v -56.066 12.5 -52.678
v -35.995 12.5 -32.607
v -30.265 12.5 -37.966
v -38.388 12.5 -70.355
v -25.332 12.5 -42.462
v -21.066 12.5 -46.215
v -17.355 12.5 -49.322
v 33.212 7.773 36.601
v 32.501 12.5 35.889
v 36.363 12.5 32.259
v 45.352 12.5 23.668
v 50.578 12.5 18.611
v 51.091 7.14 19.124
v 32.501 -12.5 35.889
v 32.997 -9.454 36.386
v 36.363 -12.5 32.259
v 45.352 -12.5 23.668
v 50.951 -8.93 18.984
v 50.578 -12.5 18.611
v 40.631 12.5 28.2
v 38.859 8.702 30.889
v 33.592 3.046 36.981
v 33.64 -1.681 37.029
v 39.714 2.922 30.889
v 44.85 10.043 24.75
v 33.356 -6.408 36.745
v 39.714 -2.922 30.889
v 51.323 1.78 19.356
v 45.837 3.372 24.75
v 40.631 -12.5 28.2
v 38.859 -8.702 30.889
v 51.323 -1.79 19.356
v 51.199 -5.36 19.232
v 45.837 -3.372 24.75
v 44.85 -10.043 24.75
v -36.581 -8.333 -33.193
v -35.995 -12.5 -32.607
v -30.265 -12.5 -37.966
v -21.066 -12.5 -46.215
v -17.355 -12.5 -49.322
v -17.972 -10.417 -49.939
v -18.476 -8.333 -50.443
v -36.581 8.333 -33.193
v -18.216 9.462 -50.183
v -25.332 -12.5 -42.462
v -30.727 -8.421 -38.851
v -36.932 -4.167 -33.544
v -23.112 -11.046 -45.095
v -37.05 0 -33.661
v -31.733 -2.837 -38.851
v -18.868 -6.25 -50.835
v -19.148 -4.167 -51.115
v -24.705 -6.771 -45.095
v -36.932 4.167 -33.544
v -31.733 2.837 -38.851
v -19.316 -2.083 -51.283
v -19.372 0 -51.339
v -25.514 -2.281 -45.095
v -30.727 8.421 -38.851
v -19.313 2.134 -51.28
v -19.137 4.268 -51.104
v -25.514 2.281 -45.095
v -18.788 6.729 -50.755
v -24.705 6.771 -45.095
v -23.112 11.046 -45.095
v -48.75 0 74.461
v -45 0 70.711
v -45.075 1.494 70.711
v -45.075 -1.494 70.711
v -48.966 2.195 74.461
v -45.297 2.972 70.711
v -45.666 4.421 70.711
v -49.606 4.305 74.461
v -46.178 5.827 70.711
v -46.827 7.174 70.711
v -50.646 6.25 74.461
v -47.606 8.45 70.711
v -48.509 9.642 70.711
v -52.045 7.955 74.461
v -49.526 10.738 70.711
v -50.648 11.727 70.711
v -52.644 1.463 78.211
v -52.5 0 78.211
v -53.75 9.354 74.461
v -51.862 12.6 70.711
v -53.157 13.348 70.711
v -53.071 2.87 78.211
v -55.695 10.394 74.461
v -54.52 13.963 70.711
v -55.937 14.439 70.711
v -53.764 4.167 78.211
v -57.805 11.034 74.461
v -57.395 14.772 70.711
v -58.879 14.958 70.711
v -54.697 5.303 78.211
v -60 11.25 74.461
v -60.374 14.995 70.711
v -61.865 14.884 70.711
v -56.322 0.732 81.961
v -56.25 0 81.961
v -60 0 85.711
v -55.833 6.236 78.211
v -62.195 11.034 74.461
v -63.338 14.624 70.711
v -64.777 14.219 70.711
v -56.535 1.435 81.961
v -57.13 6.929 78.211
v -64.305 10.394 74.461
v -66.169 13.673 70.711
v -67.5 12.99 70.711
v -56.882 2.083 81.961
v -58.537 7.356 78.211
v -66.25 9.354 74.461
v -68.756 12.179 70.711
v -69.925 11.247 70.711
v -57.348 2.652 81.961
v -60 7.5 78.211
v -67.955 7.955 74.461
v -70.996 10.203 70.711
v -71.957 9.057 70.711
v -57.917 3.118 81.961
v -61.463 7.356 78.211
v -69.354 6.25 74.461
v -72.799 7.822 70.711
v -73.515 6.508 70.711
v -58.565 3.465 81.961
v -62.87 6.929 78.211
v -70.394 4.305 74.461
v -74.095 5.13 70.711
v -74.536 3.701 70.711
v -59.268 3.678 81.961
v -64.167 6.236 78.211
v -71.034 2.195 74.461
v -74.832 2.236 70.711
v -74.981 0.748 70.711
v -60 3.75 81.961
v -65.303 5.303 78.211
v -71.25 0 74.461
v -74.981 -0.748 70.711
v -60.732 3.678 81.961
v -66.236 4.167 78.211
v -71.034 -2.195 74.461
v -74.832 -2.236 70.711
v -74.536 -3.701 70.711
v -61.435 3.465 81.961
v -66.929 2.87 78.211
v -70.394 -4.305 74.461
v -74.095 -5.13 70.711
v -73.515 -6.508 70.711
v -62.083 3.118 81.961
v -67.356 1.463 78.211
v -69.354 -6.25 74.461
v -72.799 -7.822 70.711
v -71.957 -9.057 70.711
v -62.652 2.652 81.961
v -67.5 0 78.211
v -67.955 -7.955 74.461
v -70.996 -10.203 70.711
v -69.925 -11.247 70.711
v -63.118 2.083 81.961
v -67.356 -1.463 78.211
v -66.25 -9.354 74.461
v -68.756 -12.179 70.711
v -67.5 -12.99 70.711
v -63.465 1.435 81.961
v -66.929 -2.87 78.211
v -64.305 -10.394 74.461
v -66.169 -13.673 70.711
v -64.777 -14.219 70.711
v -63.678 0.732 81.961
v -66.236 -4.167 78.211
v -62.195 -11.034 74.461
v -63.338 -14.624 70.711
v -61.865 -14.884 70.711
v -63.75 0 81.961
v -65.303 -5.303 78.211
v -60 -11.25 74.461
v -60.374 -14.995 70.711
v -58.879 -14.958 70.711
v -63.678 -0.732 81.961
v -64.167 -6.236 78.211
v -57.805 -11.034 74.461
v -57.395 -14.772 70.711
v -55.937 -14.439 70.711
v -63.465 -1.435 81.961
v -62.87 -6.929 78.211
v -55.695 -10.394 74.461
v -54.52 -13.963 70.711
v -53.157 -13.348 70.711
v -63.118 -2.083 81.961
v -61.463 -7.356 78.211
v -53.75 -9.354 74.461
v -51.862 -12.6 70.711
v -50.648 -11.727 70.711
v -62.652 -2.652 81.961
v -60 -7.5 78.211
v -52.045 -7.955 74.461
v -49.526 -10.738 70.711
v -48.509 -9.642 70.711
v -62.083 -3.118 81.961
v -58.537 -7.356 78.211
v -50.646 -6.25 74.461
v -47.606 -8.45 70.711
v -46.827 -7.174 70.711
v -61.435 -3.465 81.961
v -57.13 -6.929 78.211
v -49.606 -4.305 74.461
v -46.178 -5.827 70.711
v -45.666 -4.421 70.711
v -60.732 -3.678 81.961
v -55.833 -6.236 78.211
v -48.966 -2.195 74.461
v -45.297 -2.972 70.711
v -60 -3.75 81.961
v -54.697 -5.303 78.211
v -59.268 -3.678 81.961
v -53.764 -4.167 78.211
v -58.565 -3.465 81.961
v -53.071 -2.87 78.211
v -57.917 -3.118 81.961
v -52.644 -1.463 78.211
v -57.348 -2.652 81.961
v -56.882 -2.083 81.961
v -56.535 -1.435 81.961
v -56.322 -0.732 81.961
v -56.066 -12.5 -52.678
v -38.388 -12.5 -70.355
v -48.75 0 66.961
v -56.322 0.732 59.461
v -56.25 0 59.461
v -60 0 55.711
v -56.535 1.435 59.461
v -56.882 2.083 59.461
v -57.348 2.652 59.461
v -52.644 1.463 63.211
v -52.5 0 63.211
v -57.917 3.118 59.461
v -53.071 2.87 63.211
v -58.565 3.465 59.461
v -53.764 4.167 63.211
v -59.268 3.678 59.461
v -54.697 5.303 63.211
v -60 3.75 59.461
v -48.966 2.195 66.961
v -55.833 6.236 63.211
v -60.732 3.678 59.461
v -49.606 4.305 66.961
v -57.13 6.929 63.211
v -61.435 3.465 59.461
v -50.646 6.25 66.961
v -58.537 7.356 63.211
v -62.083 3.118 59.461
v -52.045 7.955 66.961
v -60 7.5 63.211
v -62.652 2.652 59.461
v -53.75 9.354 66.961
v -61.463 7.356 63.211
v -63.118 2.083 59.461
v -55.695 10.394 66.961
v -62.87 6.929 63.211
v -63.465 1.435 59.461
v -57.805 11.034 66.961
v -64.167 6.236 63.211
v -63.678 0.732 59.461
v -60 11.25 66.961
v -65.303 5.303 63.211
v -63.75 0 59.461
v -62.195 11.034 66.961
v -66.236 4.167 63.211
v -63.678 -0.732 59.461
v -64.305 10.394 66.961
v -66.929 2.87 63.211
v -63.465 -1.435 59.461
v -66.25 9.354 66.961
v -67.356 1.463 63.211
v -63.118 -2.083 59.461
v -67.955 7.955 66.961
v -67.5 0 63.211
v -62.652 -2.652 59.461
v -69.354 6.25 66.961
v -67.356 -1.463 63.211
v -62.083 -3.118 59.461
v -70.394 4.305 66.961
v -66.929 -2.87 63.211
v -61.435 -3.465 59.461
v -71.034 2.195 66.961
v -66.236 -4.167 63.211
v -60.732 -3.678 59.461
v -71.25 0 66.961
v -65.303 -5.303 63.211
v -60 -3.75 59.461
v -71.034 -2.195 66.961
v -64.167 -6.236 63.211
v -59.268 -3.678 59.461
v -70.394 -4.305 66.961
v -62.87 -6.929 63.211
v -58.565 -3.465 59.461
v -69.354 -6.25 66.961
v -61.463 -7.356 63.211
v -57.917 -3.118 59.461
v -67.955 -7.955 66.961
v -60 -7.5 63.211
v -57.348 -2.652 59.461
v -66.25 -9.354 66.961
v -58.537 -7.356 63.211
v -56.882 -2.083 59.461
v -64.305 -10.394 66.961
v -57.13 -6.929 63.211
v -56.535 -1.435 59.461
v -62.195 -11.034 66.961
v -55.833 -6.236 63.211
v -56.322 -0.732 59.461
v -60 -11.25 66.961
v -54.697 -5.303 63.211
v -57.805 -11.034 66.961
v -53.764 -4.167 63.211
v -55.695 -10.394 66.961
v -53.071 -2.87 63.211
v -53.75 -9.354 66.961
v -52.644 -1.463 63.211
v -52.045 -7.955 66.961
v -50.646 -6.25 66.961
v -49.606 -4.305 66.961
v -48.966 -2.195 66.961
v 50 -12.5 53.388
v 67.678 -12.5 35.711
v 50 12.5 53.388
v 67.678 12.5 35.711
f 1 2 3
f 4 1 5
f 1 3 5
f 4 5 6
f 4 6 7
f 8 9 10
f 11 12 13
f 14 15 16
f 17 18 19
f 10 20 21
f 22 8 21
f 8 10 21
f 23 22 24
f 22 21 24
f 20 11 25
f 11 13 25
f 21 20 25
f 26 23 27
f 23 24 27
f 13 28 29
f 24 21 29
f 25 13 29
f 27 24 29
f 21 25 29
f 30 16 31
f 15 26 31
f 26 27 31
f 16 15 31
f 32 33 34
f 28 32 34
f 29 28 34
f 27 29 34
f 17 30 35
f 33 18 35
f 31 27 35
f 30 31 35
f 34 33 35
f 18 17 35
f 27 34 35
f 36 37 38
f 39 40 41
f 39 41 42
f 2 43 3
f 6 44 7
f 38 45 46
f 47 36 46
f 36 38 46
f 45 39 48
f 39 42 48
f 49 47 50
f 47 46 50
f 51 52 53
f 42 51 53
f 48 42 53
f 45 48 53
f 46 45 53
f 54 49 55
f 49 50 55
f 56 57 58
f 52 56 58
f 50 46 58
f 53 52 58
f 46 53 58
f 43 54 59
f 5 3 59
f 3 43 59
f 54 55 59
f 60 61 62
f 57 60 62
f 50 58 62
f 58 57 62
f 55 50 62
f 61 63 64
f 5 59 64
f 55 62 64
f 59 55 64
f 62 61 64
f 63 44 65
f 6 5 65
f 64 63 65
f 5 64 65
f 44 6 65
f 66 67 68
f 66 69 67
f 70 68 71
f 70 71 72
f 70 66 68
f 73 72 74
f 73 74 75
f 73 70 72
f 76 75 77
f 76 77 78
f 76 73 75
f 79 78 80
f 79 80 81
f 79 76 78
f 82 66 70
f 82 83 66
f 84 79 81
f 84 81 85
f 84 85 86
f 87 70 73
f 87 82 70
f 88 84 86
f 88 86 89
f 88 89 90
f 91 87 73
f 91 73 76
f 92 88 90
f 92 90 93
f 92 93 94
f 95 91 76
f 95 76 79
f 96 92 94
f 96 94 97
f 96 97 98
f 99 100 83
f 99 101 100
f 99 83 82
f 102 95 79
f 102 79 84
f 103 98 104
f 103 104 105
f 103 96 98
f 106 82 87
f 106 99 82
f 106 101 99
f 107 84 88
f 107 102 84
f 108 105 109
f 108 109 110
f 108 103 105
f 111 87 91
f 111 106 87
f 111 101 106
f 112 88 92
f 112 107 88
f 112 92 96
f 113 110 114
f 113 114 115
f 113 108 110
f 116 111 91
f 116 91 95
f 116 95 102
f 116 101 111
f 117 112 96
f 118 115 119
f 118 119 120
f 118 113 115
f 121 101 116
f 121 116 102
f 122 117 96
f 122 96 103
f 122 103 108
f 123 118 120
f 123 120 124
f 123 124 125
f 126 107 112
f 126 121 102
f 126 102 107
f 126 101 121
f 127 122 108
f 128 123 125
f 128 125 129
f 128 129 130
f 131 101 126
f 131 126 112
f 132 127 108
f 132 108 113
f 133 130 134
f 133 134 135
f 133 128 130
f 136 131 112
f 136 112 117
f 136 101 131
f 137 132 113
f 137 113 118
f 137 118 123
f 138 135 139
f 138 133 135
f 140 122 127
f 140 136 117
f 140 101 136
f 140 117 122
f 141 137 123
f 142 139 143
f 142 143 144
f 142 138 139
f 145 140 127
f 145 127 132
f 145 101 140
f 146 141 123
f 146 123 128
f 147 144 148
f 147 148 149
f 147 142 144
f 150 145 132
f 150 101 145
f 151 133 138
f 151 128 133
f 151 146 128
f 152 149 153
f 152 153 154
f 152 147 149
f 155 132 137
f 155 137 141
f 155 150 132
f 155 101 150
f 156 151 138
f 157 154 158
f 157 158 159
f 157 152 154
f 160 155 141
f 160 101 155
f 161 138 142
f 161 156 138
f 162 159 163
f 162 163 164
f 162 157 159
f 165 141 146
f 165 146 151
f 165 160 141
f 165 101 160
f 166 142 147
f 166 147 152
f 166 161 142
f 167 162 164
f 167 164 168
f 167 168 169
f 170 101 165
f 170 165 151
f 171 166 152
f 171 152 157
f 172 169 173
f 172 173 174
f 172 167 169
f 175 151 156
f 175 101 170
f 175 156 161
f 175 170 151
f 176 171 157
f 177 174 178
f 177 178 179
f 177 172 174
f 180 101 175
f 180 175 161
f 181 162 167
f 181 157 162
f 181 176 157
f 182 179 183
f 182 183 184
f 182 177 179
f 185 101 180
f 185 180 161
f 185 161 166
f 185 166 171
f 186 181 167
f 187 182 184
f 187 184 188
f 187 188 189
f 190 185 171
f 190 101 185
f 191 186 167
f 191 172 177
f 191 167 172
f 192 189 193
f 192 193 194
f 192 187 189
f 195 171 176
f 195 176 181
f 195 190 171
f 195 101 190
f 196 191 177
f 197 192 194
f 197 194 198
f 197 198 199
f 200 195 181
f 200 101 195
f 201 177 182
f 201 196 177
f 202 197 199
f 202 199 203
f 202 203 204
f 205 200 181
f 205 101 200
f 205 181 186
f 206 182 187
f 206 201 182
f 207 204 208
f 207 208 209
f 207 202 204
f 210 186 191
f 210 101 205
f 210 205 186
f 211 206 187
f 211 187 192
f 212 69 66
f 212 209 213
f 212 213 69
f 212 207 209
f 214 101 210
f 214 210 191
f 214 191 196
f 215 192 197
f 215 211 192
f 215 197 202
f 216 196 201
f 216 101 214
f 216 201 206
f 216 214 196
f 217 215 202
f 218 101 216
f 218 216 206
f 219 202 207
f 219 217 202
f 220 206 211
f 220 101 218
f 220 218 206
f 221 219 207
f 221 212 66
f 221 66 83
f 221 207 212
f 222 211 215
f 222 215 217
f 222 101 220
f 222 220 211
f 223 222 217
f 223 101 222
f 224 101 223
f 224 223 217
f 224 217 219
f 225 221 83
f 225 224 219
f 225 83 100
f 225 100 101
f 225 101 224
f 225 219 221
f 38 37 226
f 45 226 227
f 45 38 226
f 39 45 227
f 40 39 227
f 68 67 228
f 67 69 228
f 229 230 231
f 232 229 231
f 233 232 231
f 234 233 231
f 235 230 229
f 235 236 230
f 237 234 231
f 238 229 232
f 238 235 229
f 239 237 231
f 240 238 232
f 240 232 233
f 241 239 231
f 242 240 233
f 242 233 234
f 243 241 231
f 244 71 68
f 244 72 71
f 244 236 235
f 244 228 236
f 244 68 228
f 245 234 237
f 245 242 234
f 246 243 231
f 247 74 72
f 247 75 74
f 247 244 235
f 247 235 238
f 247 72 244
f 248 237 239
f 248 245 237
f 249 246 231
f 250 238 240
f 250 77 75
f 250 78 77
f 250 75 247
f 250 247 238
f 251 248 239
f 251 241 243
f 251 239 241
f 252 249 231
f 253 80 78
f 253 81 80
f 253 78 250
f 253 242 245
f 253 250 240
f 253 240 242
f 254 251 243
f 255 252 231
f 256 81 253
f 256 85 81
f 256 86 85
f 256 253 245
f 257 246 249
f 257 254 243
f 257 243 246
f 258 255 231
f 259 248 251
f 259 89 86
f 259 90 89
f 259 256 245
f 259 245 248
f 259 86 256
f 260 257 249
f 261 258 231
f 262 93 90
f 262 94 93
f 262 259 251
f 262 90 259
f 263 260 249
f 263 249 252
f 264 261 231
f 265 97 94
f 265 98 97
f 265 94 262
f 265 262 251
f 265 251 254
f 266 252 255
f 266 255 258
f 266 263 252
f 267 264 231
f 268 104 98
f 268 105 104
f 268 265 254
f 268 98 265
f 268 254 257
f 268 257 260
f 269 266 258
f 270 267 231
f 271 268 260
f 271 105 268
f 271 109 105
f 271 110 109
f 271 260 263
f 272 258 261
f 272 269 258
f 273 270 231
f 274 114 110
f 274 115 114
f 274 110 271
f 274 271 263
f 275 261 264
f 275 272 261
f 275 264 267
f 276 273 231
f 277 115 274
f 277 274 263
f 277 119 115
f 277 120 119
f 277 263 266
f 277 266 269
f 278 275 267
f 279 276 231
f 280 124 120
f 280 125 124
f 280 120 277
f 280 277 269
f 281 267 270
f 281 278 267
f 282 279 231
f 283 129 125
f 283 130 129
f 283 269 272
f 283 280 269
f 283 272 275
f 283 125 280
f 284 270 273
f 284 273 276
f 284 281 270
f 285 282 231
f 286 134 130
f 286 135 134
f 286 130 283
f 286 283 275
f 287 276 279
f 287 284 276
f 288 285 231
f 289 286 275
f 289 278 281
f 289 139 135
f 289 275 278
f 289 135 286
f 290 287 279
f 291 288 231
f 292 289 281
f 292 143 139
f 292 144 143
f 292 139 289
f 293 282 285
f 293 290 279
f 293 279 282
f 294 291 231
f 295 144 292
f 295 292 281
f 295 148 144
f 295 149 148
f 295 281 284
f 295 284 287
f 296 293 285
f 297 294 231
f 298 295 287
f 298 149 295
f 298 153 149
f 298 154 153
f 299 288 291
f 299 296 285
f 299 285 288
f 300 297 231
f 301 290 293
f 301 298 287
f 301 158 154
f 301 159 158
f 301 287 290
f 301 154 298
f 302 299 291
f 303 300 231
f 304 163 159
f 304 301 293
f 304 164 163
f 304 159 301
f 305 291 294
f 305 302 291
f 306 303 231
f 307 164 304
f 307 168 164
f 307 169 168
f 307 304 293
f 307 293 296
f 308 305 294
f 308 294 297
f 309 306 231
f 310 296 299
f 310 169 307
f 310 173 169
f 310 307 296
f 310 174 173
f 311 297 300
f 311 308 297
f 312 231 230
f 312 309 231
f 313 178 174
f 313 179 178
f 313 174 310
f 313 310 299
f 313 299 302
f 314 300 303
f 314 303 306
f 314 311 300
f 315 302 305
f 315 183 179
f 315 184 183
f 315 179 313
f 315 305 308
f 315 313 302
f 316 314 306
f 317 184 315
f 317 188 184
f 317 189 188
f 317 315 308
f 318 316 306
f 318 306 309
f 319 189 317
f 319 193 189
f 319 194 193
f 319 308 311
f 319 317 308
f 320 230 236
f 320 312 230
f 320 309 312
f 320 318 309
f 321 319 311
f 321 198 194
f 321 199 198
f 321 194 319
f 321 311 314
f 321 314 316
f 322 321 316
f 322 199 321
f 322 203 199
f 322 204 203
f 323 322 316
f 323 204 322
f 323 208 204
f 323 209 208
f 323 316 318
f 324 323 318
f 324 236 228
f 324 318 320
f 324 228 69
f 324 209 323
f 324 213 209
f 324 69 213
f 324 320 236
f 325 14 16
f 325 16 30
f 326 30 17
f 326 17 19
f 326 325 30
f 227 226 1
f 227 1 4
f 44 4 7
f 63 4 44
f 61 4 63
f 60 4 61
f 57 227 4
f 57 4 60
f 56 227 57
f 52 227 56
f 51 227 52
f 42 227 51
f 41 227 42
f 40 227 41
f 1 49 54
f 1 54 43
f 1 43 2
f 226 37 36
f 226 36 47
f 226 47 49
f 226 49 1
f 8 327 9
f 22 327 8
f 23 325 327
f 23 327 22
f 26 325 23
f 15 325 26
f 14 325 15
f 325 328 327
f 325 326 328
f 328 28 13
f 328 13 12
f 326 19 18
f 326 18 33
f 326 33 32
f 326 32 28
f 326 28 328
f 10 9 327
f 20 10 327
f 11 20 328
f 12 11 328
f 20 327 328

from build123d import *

# Parameters (mm, degrees)
F5_DEPTH = 12.5


with BuildPart() as f1:
    # F0 (on Front) → F1 (revolve)
    with BuildSketch(Plane.XZ):
        Polygon((0, -70.710678), (0, 70.710678), (-70.710678, 0), align=None)
    revolve(axis=Axis((0, 0, -1.175915), (0, 0, -1)))


with BuildPart() as f3:
    # F2 (on Front) → F3 (revolve)
    with BuildSketch(Plane.XZ):
        Polygon((-60, 55.710678), (-45, 70.710678), (-60, 85.710678), align=None)
    revolve(axis=Axis((-60, 0, 69.177093), (0, 0, 1)))


with BuildPart() as f5:
    # F4 (on Front) → F5 (new body, symmetric)
    with BuildSketch(Plane.XZ):
        Polygon((67.67767, 35.710678), (50, 53.388348), (-56.066017, -52.67767), (-38.388348, -70.355339), align=None)
    extrude(amount=F5_DEPTH, both=True)

    # F6: cut F1
    add(f1.part, mode=Mode.SUBTRACT)


solid = Compound([f3.part, f5.part])
